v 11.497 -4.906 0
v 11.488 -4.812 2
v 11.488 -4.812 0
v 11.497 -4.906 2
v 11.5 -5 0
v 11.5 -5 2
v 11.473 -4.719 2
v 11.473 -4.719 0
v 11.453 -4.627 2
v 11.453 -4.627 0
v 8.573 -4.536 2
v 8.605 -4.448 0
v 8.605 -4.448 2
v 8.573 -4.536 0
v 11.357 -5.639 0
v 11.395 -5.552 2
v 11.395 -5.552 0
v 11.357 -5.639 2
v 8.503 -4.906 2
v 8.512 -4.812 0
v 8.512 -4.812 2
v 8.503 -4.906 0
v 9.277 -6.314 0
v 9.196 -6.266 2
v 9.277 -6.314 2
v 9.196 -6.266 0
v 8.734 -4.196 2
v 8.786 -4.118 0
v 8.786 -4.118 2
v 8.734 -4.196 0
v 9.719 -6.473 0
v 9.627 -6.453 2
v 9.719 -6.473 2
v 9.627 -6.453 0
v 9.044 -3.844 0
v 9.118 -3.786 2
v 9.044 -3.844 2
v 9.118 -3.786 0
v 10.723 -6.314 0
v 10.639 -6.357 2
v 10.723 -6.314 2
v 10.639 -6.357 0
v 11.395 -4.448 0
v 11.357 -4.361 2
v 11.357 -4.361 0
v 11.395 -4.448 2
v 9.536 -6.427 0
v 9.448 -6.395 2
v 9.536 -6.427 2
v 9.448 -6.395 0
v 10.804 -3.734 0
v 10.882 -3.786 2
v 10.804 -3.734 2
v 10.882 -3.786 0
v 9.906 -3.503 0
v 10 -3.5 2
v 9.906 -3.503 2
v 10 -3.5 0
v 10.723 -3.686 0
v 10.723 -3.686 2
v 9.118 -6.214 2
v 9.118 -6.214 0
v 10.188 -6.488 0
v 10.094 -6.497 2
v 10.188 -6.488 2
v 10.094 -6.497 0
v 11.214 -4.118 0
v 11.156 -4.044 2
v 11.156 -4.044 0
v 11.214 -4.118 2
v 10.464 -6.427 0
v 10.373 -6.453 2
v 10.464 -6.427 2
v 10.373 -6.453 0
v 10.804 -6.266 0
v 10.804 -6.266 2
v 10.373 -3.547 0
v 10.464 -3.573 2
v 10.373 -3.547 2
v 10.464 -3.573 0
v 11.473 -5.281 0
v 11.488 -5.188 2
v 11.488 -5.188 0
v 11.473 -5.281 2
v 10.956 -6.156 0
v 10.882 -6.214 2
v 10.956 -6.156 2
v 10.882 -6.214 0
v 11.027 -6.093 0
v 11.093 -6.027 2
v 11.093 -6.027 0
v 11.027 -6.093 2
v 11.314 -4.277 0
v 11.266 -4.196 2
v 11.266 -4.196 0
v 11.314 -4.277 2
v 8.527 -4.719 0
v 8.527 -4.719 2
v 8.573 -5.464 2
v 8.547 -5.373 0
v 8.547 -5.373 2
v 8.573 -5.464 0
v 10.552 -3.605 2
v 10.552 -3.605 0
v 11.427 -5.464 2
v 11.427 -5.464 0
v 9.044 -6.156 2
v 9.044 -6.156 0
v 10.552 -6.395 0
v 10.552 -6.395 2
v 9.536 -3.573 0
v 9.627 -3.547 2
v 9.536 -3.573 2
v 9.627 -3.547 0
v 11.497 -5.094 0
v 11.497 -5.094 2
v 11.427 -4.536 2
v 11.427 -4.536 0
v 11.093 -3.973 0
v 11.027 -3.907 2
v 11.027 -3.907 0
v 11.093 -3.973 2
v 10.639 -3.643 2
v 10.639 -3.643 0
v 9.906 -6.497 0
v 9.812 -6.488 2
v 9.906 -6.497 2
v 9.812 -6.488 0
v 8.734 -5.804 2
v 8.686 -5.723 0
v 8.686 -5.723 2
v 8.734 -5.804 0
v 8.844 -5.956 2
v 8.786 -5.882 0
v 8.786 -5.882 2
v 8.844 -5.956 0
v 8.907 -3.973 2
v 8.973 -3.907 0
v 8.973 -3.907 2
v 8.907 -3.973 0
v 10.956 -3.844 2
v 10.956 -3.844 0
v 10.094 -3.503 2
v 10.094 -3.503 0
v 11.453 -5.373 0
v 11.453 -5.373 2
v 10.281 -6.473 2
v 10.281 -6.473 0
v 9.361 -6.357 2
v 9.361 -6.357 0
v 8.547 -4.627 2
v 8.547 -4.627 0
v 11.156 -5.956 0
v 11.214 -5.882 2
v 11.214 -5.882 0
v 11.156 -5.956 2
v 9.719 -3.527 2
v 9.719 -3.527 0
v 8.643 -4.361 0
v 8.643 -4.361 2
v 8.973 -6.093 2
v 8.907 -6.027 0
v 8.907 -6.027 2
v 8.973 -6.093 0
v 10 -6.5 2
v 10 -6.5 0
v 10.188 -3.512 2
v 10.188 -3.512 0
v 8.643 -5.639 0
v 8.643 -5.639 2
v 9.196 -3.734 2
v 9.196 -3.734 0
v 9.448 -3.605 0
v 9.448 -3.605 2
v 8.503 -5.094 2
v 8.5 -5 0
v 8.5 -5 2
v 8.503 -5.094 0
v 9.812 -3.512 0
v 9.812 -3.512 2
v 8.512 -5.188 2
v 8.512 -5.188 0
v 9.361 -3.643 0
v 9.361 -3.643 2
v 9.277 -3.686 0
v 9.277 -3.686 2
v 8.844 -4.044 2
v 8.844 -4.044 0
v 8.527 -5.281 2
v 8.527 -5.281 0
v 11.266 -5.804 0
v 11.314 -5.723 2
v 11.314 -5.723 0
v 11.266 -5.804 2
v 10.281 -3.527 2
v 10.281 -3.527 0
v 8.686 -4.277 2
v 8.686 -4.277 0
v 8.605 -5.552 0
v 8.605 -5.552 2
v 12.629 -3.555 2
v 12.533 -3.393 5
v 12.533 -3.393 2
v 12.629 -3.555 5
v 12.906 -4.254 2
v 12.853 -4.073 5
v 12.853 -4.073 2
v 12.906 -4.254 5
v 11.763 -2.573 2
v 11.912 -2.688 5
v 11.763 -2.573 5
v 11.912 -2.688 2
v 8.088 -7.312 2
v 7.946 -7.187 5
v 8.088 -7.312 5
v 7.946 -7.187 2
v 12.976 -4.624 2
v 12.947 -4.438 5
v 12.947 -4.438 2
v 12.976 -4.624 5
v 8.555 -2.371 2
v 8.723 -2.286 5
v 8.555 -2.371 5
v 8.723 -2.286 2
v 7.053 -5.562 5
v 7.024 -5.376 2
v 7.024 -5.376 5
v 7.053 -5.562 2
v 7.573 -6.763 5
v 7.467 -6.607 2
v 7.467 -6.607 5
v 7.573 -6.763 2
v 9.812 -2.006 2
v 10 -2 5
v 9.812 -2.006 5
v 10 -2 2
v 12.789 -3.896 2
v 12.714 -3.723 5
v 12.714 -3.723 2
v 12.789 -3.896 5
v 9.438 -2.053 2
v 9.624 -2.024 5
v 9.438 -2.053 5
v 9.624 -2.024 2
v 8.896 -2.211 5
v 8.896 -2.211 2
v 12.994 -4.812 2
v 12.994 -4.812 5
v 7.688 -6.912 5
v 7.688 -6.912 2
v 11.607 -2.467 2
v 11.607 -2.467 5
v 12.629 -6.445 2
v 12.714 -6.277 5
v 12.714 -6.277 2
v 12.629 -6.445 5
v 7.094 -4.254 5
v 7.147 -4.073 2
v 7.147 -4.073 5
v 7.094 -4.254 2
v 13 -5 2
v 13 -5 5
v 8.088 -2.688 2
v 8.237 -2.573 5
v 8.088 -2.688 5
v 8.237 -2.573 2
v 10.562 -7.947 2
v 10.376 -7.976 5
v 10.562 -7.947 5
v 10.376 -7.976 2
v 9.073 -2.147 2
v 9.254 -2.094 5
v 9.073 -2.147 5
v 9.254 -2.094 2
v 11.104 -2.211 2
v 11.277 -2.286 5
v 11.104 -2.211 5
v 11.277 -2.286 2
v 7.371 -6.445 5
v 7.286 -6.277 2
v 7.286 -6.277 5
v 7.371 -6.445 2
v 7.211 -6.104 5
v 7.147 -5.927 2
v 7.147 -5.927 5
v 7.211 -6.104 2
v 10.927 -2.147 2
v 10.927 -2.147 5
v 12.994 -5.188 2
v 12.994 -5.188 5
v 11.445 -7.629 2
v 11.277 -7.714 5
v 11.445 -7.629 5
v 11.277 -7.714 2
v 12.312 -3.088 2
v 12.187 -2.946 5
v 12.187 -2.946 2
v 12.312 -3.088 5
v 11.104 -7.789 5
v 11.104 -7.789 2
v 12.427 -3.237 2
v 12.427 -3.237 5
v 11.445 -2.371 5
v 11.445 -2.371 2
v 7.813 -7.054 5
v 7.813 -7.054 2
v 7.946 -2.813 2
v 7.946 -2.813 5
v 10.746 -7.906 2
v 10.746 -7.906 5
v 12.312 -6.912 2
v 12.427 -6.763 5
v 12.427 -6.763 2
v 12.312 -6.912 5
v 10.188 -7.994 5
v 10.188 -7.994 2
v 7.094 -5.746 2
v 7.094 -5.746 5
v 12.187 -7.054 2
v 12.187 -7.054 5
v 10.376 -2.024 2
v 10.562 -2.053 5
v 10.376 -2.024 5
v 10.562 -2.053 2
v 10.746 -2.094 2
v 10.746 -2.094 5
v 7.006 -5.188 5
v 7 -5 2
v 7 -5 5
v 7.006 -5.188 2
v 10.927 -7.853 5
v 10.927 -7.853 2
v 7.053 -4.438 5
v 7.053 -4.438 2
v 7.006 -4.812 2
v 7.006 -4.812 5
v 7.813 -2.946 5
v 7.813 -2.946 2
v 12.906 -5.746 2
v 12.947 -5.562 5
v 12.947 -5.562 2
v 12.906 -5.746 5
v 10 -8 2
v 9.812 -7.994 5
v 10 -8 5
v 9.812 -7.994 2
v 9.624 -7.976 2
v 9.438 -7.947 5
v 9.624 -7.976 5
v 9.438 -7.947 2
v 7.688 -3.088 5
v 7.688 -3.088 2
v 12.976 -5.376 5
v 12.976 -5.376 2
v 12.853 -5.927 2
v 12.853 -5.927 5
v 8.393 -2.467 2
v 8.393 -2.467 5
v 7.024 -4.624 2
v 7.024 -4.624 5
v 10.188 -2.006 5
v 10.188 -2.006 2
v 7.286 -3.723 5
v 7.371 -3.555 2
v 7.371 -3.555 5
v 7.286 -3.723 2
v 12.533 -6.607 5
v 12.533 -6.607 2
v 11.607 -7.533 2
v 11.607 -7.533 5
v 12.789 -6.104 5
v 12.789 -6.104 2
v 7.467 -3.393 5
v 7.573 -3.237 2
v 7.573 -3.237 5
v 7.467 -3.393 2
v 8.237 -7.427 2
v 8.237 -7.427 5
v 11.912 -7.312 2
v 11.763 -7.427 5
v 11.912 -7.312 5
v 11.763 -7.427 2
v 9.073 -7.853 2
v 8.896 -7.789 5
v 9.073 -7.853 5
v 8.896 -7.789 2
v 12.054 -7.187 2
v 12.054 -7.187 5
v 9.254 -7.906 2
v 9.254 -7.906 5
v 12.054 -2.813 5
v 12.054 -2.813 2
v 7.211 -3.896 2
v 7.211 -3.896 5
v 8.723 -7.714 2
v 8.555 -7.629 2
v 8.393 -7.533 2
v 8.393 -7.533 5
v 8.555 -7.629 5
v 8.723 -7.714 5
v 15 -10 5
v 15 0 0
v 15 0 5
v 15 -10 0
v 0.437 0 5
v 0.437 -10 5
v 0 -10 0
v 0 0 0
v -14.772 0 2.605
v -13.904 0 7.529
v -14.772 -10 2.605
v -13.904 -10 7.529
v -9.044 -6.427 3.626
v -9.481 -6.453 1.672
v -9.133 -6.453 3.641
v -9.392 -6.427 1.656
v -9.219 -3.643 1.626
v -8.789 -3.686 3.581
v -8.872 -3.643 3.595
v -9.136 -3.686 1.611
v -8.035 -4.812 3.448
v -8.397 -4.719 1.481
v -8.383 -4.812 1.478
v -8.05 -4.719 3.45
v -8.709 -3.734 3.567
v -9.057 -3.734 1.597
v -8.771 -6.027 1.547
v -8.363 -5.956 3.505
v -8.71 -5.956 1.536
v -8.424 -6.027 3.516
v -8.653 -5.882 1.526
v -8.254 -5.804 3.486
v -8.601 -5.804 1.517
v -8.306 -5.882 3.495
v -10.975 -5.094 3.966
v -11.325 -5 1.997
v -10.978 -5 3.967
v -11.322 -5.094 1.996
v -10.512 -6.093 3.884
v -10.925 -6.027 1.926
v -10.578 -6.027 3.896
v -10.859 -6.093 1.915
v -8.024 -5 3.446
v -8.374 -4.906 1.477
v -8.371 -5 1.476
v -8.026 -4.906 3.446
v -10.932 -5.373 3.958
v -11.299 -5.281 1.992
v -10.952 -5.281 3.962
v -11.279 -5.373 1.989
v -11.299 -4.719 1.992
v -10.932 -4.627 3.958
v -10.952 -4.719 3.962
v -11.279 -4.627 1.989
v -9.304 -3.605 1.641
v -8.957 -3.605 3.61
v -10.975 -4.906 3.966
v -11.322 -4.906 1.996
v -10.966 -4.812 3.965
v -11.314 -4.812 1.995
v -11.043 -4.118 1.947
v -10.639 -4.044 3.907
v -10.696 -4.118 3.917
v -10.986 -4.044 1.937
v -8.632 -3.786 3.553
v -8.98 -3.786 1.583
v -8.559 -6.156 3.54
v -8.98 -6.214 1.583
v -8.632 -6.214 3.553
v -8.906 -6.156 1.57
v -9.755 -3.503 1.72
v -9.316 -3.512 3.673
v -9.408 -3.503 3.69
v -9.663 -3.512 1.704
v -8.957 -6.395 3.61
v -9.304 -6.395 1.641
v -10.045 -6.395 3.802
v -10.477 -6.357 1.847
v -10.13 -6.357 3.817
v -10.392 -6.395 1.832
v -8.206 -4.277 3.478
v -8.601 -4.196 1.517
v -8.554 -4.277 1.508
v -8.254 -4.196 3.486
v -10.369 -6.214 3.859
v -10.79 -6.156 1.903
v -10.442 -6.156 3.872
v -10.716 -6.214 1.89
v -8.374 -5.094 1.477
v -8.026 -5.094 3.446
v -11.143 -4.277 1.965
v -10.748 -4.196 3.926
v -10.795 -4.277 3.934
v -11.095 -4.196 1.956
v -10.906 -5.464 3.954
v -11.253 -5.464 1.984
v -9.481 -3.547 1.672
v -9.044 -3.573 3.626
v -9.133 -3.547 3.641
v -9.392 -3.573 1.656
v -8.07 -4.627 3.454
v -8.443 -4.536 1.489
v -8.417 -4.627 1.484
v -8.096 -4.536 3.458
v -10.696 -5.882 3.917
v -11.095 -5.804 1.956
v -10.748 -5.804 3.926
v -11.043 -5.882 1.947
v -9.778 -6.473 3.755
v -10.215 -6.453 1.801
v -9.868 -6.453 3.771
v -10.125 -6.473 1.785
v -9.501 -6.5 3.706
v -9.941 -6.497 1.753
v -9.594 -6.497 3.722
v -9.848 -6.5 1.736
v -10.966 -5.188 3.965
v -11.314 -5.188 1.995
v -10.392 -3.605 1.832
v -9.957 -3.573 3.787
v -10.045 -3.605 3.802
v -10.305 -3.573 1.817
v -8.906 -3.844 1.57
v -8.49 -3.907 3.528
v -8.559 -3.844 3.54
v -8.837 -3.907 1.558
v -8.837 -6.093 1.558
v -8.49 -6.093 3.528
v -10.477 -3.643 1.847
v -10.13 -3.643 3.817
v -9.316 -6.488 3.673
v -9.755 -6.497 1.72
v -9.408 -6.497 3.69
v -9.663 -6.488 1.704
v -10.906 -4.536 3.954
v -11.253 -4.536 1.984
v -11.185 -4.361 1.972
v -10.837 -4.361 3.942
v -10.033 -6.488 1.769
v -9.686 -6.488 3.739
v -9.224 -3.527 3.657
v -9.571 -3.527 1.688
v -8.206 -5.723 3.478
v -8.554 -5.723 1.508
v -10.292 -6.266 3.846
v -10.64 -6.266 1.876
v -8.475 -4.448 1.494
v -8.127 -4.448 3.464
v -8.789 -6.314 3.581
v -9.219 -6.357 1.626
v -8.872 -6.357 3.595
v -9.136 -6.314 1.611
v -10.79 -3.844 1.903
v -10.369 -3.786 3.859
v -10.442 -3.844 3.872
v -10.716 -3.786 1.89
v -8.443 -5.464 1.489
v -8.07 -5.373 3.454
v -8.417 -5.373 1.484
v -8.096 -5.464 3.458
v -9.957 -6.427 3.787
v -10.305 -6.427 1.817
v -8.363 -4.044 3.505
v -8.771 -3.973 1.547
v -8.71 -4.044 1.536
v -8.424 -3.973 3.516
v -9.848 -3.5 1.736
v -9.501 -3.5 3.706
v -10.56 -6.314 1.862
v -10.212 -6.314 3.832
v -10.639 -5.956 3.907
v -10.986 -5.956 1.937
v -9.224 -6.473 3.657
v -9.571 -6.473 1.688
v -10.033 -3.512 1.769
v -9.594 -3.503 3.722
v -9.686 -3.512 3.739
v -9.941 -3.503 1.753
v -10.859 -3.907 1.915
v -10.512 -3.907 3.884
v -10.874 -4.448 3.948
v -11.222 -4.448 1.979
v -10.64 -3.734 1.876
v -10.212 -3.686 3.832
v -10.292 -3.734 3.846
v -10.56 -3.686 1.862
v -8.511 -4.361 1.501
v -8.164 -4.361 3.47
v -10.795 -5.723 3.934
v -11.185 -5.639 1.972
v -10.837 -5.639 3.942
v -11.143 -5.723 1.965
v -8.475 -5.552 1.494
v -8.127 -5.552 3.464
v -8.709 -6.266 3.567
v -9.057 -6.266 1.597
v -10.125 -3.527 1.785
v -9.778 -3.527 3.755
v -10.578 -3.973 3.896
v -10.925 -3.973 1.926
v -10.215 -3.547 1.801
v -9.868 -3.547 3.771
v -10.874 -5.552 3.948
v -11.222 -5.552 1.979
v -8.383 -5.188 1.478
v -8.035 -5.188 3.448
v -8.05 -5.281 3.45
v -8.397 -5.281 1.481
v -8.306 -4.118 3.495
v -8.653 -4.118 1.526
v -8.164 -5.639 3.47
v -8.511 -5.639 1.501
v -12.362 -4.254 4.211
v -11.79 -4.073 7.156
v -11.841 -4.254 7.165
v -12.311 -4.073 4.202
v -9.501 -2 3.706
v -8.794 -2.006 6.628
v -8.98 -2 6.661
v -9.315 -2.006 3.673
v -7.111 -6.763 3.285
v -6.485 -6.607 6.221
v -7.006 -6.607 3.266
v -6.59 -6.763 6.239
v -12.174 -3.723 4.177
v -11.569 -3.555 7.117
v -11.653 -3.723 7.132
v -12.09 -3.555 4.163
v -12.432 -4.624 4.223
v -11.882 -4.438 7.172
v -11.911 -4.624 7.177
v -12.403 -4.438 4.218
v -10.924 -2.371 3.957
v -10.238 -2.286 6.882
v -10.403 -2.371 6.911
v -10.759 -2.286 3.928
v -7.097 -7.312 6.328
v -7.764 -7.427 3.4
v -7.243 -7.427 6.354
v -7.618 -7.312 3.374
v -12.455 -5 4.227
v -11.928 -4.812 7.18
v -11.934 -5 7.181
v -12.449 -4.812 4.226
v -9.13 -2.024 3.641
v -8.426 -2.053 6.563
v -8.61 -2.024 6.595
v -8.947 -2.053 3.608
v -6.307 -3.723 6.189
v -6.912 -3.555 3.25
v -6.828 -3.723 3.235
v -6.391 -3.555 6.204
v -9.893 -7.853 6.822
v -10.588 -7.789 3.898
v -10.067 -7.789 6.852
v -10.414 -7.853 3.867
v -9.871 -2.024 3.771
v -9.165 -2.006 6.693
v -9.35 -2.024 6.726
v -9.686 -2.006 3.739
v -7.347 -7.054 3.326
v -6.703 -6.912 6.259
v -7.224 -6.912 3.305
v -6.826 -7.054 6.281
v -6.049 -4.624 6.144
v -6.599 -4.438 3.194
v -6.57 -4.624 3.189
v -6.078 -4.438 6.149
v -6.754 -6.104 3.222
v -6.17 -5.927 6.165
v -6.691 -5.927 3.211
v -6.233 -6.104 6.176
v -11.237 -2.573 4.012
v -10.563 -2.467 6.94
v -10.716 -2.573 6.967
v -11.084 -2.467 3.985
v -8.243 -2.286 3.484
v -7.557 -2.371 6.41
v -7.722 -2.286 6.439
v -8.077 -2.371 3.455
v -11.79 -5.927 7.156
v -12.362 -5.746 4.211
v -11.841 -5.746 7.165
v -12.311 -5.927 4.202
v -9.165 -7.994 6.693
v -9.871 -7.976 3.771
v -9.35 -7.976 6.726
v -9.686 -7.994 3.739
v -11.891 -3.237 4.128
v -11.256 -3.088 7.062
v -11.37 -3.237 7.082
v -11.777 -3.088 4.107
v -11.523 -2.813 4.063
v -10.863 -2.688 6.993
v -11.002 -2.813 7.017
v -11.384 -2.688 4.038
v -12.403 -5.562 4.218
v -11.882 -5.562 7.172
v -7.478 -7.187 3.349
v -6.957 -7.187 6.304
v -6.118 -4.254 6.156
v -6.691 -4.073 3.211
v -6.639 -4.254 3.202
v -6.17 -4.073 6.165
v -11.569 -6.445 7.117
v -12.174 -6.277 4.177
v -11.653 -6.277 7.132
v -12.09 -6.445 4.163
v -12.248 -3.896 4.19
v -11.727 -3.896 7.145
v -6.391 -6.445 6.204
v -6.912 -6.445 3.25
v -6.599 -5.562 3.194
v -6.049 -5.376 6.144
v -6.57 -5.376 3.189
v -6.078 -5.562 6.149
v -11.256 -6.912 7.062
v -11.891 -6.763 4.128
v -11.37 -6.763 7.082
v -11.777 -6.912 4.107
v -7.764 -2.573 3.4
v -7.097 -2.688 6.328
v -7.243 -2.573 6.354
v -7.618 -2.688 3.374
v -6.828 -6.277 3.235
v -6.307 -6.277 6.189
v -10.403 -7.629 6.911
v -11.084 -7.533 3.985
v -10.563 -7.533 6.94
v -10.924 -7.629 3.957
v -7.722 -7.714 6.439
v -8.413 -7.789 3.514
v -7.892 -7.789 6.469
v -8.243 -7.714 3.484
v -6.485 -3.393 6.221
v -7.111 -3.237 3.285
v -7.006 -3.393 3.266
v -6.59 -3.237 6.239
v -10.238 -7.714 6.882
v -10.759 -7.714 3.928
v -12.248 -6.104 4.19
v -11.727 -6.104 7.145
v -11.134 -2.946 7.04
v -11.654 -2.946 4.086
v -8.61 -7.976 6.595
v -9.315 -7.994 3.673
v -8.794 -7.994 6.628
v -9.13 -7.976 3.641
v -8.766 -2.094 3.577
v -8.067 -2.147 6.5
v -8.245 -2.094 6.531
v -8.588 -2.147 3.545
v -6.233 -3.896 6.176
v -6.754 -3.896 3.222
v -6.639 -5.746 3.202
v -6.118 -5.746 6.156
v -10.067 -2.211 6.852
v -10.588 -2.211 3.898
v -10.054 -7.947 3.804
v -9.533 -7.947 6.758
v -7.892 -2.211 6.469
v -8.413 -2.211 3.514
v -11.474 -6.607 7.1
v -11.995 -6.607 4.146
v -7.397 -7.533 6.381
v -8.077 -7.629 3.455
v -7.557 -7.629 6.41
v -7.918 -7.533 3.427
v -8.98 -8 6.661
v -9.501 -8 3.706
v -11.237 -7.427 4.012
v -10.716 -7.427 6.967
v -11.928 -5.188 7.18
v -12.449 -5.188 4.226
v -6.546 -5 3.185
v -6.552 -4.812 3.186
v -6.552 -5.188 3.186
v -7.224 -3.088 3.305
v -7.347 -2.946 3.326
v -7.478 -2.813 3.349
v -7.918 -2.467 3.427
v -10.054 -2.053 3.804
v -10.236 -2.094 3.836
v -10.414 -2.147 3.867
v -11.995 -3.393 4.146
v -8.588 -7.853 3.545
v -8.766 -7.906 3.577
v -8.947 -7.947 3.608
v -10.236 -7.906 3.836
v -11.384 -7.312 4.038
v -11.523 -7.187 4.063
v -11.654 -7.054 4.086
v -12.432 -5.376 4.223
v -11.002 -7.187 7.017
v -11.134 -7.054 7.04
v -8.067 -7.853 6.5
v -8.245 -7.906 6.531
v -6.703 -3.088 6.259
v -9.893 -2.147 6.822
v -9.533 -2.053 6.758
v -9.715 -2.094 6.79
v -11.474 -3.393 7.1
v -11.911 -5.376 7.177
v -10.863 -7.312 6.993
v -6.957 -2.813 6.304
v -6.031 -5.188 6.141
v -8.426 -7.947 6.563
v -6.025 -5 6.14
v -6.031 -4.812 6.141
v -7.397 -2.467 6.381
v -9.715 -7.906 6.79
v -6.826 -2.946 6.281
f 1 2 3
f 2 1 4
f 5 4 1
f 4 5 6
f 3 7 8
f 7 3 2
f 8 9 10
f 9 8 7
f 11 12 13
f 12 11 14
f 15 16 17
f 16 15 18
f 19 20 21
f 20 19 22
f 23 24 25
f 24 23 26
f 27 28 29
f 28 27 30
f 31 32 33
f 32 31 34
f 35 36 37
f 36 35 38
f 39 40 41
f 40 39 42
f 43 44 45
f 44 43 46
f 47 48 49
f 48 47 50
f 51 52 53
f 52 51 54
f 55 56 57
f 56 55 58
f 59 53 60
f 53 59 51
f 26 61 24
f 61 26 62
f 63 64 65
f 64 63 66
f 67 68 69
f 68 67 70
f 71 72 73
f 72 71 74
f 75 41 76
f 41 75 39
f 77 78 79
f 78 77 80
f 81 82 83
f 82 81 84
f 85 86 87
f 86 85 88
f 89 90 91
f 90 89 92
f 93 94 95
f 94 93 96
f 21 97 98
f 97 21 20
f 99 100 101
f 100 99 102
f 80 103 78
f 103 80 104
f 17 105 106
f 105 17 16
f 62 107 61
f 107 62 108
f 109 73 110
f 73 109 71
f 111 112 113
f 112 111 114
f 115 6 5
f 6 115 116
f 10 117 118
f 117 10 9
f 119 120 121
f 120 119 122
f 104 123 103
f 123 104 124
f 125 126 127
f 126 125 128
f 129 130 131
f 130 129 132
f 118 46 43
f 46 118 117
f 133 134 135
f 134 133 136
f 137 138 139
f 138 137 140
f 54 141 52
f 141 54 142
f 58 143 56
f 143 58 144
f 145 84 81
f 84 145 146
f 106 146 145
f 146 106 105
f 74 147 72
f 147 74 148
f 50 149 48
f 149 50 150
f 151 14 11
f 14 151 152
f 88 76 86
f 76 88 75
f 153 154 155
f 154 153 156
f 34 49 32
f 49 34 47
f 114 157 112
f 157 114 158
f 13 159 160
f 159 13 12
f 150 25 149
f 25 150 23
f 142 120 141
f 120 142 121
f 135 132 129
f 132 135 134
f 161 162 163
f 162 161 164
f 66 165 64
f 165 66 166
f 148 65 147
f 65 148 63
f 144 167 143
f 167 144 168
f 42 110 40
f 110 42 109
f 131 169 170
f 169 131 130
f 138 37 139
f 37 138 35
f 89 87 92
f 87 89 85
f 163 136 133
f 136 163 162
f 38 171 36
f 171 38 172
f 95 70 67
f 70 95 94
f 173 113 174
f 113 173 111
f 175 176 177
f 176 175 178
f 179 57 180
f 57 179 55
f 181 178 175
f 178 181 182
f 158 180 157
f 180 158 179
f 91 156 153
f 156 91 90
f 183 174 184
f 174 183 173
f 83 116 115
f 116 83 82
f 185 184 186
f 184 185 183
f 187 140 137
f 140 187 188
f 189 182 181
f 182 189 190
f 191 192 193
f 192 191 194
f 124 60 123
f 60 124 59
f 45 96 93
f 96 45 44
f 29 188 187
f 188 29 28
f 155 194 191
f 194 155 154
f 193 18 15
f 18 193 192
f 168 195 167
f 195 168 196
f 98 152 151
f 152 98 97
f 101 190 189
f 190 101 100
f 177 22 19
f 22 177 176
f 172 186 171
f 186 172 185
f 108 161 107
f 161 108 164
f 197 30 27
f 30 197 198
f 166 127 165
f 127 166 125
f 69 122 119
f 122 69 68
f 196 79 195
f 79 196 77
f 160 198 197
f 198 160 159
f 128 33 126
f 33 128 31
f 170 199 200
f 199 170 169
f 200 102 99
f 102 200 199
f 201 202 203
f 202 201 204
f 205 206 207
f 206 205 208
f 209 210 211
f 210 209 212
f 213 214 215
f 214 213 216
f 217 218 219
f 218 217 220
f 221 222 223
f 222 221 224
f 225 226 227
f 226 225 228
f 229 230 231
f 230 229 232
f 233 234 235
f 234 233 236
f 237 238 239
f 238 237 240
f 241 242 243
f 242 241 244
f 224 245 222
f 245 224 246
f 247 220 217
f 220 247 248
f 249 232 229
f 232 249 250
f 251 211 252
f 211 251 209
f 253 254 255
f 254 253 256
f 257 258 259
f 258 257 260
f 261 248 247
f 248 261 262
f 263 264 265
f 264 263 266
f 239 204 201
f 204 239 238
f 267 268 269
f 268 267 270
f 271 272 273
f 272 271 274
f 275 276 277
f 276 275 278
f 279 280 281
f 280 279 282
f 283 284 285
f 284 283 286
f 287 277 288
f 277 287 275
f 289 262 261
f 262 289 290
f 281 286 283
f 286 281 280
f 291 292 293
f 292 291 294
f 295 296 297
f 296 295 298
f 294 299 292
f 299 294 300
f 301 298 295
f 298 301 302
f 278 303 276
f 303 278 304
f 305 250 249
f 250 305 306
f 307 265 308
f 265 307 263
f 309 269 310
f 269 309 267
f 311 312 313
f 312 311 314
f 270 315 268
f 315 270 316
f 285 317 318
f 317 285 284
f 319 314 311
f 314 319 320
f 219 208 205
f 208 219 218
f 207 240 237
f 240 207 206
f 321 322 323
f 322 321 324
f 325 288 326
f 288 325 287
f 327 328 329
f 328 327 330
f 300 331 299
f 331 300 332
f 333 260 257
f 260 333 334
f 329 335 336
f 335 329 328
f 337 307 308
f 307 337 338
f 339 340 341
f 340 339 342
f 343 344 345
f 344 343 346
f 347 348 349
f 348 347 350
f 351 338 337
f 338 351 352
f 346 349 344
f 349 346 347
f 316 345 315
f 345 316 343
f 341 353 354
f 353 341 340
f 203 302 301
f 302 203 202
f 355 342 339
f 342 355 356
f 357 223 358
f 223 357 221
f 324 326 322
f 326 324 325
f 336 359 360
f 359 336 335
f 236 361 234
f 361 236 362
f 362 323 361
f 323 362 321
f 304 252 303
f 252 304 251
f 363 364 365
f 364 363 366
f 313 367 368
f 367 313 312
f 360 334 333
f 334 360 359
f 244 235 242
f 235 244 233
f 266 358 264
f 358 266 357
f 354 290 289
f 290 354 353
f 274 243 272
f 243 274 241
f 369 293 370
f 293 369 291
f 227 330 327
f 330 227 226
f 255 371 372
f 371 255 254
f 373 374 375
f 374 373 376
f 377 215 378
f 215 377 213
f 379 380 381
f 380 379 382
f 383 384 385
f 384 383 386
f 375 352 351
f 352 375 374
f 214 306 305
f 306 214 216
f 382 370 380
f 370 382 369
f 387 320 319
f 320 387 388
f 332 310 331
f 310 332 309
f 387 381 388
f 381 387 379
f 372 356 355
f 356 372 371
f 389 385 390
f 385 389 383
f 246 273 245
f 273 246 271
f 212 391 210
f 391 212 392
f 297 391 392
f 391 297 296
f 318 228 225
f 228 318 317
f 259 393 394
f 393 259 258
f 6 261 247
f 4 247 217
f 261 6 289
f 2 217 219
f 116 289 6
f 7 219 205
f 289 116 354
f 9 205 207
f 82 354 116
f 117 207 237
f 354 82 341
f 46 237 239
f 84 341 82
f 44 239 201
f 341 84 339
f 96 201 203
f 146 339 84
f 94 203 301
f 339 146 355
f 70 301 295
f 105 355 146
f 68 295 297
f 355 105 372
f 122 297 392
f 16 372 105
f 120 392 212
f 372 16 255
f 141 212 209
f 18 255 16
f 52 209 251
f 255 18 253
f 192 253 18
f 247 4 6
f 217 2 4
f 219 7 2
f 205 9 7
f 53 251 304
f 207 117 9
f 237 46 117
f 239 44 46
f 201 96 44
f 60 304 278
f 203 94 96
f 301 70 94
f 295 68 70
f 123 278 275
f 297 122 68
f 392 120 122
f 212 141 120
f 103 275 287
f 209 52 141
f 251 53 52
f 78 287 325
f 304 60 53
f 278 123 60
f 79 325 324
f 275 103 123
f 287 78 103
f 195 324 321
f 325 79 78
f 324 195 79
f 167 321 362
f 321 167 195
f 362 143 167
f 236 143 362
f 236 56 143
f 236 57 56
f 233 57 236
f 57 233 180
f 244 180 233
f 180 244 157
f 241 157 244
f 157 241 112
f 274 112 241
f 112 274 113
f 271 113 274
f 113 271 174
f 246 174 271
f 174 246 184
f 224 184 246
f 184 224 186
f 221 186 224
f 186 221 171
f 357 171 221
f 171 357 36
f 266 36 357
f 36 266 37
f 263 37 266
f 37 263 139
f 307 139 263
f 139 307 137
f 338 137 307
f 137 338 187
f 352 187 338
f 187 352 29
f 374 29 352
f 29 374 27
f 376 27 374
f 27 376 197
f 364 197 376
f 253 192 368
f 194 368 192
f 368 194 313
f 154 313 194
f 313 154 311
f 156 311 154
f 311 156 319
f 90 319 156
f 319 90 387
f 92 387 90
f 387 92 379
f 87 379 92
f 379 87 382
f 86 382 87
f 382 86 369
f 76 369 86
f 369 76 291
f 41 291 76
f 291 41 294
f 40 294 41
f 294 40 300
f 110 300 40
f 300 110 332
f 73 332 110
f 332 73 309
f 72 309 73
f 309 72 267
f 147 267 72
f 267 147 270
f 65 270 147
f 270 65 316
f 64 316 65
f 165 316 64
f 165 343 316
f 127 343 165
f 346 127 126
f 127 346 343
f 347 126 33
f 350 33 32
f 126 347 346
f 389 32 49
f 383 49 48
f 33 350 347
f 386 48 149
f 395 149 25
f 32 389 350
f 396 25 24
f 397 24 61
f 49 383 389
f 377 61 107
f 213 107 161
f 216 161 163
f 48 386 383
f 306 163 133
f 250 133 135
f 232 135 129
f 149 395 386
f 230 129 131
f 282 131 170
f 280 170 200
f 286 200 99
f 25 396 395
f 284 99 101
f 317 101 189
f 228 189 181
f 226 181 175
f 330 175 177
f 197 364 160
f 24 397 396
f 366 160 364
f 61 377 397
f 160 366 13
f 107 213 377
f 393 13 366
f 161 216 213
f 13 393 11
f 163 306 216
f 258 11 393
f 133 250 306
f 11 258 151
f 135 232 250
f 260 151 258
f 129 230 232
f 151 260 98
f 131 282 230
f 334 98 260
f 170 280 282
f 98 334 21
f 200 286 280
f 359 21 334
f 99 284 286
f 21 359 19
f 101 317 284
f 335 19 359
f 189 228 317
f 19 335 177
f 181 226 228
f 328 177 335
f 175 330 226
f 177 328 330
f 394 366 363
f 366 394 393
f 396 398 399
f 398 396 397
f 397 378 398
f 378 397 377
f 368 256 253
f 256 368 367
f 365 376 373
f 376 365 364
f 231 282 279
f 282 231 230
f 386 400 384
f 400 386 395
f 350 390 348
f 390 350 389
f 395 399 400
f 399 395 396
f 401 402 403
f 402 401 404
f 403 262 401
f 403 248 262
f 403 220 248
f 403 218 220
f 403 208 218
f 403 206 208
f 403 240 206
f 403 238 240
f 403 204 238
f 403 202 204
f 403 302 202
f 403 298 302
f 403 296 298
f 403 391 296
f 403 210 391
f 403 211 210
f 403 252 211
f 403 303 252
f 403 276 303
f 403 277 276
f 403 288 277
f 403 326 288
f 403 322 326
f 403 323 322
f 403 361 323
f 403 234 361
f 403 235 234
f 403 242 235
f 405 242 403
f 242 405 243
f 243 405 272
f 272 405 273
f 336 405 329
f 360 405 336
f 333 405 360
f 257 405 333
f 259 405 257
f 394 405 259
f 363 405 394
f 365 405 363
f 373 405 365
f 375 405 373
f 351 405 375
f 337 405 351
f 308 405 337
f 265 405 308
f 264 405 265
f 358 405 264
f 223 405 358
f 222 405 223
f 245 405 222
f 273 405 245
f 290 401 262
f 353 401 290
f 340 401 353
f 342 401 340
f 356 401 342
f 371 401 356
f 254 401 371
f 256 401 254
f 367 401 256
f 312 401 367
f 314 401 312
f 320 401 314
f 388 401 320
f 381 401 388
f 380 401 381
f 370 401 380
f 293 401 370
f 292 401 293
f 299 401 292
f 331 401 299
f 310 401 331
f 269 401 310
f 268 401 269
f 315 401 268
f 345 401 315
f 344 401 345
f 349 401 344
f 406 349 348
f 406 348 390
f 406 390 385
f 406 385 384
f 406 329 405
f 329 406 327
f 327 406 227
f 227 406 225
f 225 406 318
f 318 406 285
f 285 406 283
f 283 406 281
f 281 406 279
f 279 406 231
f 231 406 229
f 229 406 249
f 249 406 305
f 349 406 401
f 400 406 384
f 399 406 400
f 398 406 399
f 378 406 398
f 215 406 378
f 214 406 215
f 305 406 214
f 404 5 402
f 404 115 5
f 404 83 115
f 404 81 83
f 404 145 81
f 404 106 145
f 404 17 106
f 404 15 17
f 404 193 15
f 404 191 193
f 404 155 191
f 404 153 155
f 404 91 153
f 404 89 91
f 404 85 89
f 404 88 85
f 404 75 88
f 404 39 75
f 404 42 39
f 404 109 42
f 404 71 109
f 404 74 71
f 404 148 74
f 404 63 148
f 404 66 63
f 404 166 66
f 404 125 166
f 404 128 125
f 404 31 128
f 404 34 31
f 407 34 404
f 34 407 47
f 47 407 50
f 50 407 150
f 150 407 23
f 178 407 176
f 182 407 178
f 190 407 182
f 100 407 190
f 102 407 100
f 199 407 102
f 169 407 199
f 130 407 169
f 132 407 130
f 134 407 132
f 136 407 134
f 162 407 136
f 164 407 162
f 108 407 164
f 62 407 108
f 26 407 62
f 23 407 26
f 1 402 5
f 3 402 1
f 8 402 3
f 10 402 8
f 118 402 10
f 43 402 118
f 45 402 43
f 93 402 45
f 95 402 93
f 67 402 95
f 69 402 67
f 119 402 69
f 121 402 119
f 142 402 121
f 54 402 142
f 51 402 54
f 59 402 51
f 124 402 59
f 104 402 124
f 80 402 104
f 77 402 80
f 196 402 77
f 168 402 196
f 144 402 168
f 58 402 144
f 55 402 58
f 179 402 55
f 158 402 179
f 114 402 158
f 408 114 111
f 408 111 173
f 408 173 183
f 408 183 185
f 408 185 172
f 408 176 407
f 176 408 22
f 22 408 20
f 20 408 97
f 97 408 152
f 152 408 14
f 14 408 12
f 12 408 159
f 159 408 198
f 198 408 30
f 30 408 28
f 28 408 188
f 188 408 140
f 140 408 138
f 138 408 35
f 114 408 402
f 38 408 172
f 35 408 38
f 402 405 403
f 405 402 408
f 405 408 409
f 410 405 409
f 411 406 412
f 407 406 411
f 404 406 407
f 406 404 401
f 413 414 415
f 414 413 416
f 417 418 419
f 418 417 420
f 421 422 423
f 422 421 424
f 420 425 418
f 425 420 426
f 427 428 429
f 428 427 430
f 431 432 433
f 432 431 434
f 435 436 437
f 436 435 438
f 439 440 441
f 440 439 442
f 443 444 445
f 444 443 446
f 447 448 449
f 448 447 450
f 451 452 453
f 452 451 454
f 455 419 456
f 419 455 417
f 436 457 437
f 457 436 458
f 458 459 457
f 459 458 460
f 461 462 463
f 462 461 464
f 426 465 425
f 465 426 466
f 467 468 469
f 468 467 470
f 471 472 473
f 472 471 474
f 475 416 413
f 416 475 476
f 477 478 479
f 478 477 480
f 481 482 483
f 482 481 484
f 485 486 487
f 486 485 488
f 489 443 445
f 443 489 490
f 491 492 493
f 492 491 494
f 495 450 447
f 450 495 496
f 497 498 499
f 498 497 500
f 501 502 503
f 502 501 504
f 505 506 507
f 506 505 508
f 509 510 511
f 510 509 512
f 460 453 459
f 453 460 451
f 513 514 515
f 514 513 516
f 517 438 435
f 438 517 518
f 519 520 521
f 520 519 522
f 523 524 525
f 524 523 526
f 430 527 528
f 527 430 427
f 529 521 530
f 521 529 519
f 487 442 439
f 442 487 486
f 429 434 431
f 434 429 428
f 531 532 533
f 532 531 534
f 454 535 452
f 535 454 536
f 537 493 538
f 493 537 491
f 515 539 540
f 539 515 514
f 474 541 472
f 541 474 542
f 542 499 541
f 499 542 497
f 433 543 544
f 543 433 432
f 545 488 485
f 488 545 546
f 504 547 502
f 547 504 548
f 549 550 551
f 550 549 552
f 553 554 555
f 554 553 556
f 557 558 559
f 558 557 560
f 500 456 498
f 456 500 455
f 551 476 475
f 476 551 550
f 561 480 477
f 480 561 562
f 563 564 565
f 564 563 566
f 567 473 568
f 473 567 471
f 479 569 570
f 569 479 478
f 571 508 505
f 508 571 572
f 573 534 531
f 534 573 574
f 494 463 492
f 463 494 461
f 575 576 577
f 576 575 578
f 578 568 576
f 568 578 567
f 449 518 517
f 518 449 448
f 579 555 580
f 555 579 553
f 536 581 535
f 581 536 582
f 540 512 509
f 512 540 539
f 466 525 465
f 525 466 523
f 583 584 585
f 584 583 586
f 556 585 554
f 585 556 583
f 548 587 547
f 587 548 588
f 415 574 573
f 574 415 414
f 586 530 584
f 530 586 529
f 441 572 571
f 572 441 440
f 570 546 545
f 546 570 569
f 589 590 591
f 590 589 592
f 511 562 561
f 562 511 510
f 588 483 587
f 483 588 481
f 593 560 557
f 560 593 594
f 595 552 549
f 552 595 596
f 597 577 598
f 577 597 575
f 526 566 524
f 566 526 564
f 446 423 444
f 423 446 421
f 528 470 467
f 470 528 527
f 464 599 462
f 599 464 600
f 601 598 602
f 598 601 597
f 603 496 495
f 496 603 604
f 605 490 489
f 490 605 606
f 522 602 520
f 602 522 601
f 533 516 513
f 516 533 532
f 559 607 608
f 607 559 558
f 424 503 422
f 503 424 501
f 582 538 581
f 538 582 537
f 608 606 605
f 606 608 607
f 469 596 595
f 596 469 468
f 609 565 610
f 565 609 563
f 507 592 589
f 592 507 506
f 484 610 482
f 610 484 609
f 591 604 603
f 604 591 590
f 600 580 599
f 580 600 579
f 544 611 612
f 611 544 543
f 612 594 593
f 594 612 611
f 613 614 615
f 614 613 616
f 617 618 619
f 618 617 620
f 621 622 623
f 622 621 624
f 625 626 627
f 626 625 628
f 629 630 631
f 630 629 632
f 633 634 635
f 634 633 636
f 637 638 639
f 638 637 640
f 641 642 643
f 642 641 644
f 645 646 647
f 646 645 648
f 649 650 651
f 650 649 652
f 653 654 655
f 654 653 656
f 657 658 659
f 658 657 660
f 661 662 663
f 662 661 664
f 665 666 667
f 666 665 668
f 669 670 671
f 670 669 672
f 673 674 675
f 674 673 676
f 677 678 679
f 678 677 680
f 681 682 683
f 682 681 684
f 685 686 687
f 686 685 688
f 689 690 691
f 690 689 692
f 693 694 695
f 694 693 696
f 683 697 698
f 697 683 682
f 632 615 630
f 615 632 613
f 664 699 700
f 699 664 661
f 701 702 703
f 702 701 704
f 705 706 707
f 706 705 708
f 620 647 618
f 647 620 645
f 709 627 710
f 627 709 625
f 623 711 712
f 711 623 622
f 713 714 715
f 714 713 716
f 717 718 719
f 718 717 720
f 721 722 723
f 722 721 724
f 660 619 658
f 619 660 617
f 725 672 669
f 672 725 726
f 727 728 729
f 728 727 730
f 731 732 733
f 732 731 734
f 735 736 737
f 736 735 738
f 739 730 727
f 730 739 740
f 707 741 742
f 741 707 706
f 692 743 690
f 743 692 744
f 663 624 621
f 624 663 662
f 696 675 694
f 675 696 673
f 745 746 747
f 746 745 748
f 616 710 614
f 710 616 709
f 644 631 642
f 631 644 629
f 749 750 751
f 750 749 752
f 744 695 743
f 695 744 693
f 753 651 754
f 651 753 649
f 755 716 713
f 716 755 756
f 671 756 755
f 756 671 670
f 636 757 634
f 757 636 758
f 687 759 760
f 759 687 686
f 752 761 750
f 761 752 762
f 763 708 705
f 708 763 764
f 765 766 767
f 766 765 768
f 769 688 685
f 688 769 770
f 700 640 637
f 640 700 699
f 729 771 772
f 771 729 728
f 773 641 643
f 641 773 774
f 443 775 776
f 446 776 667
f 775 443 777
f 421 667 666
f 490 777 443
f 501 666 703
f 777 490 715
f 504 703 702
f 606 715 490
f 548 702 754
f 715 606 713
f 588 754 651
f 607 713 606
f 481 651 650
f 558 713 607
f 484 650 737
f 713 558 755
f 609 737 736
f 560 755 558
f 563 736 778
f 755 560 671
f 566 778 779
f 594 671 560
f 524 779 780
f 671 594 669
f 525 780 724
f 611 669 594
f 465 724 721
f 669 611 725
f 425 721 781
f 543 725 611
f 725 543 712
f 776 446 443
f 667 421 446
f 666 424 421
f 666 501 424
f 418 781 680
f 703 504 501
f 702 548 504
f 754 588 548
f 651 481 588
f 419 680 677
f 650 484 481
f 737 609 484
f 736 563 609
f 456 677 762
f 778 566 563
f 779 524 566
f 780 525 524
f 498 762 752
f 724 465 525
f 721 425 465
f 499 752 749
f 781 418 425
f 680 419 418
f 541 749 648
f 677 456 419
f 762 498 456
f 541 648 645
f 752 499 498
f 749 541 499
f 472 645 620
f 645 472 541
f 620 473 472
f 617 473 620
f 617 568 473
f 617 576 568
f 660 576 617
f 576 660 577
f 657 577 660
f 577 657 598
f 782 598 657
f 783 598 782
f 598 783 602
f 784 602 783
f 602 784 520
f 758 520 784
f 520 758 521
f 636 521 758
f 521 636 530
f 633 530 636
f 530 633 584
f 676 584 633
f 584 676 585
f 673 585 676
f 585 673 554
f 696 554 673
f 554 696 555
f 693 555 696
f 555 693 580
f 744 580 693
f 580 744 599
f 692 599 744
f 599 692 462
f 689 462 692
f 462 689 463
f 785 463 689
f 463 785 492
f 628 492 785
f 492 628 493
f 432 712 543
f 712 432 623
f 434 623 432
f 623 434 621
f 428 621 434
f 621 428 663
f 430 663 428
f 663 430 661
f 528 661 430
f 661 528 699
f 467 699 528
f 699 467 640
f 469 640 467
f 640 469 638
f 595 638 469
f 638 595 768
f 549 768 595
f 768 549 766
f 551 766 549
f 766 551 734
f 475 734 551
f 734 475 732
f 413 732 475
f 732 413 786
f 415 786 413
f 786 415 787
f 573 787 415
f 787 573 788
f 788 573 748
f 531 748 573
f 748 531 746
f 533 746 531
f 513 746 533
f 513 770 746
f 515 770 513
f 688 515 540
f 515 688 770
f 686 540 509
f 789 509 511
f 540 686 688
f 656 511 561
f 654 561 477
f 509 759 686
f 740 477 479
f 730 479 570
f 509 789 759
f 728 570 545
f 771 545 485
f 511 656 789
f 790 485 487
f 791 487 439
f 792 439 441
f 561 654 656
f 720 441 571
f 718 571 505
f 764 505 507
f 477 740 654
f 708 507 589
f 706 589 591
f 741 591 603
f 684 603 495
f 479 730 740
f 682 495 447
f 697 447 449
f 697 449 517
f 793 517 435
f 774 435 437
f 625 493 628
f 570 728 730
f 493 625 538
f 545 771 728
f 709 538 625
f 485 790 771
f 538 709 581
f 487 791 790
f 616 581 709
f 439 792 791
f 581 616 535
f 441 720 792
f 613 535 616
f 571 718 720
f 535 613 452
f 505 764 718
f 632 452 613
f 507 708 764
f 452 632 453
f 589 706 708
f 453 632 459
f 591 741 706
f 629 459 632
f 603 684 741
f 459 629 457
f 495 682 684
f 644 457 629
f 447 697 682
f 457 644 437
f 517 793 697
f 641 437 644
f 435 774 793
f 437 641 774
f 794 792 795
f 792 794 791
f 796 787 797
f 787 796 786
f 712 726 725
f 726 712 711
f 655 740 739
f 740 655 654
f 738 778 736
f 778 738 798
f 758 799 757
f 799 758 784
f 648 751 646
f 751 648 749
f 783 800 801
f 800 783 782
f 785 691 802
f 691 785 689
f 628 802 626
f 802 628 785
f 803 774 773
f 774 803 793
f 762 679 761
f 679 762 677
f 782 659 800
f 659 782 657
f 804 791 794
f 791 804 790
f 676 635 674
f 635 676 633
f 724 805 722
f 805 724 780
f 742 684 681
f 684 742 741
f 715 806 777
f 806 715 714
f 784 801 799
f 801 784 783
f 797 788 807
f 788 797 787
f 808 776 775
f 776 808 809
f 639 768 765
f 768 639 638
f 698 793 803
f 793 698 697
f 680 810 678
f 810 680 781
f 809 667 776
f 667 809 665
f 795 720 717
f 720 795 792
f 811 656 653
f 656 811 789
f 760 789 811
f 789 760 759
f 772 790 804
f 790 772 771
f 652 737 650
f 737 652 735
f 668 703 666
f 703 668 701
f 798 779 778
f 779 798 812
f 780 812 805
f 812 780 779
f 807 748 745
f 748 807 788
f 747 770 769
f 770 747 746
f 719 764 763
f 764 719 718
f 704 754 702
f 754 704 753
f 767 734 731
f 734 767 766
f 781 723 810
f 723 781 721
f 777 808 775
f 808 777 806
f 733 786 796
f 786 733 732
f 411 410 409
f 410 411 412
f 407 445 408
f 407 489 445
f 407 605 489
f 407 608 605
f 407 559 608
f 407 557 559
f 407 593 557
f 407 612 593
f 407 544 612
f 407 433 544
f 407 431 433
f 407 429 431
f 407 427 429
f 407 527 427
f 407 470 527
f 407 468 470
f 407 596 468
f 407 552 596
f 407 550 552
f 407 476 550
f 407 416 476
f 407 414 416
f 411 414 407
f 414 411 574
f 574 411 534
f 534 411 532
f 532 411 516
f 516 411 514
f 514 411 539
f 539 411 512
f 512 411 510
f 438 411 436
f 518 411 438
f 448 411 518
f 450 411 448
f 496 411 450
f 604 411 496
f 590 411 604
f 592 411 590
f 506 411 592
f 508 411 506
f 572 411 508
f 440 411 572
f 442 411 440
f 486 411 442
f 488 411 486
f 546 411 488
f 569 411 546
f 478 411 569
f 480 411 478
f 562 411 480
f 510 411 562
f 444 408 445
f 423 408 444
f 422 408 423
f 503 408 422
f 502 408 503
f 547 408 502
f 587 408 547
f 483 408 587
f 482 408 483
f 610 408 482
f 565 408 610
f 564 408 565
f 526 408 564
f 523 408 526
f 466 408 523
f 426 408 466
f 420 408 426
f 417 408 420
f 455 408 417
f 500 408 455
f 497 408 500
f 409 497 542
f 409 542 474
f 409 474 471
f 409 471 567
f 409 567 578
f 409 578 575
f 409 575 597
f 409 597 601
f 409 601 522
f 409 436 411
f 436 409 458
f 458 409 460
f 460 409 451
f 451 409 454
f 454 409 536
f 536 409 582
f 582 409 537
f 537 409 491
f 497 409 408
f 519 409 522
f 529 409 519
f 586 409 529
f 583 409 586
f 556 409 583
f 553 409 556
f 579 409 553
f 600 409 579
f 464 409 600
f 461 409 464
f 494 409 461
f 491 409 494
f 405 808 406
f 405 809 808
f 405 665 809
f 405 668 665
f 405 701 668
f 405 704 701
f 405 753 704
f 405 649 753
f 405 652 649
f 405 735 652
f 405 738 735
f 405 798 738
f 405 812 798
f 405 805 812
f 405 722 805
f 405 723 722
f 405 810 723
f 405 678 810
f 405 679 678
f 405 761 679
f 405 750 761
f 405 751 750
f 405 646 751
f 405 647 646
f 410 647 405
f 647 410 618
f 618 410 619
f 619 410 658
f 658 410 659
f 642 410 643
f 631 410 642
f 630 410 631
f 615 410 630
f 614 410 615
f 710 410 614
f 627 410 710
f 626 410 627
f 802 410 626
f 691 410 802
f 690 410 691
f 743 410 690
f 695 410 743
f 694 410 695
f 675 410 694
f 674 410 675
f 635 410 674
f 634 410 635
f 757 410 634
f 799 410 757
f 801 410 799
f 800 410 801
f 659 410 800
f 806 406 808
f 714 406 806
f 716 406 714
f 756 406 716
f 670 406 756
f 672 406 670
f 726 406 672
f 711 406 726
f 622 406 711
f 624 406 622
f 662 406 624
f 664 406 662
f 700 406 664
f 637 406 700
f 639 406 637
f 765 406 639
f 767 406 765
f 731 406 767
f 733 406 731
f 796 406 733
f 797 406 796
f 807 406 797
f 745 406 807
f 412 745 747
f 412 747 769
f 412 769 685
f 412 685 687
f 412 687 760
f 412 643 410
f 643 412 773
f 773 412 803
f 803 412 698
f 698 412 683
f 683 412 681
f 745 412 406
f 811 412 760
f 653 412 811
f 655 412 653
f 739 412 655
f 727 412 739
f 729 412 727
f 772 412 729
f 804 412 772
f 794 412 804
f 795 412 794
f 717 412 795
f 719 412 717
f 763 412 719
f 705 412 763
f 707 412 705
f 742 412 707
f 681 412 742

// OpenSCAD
// ************* Credits part *************
// "Fixing customize w" 
// Programmed by Rudy RUFFEL - Decembre 2014
// Optimized for Customizer makerbot
//
//
//********************** License ******************
//**         "Fixing customize" by rr2s          **
//**  is licensed under the Creative Commons     **
//** - Attribution - Non-Commercial license.     **
//*************************************************
//
//
// ************* Declaration part *************

/* [Dimensions] */ 
// (Width this number will be multiplied by the number of screws on height (in mm). Example : if you specify 15mm and there are two screws on height, the total height will be 30mm. The thickness of wall is proportional to the width if you indicates a width 15mm  the thickness will  5mm. But you can change if you wantt hickness in tab)
Width         = 15;       
// (Length of fixing this number will multipier by the number of screw on length (in mm). Example : if you specify 10 and there are two screws on length, the total length will be 20.)
Height        = 10;
// Angle is 60 °. It can not be over because the screws not spend mounting. You can choose an angle between 90 ° and 0 °.
angle = 10;


/* [screw] */
// (number of height screw, if you want one screw.)
NumberOfScrewHeight  = 1;
// (number of width screw)
NumberOfScrewWidth = 1  ; 
// (diameter of screw) 
DiametreScrew = 3;        
// (screw head diameter of generally 2 times the diameter of the screw. Attention ! Check that the width and height is supperior in diameter screws.)
DiametreHeadScrew = 6;
// (Height of the screw head, if you want that screw is flush chose 0. Attention ! Check that the width and height is supperior in diameter screws.)
HeightHeadScrew   = 3;
// (Resolution of screws)
ResolutionScrew=100; //[20:Draft,50:Medium,100:Fine, 200:Very fine]
	RS = ResolutionScrew;
// (Creates a hex or cylindrical head screws)
ResolutionHeadScrew=100; //[6:Bolt (hex),20:Draft,50:Medium,100:Fine, 200:Very fine]
	RH = ResolutionHeadScrew;


/* [Thickness] */
//(Thickness Wall is normaly proportional to the width (Width/3) if ThicknessWall = 0. But you can change if you want. Attention ! Check that the Thickness Wall is supperior at HeightHeadScrew.the dimention is in mm)
ThicknessWall = 0;



// ************* private variable *************
	//TH = Width/3;  //  ThicknessWall base if ThicknessWall = 0
	TH= ThicknessWall == 0  ? Width/3 : ThicknessWall;
	W = Width;     // Simplifying the Variable : Width 
	H = Height;    // Simplifying the Variable : Height
    NbScrew = NumberOfScrewHeight -1; // Simplifying the Variable : NumberOfScrewHeight
	rScrew = DiametreScrew/2;      // radius of the screw
	CWS = TH+((W-TH)/2); // centering the screw on width
	CHS = H/2; // centering the screw on Height
	rHScrew = DiametreHeadScrew/2;  //radius of the Head screw
	HHS = HeightHeadScrew; // Simplifying the Variable : HeightHeadScrew
	NbScrewWidth = NumberOfScrewWidth-1; // Simplifying the Variable :  NumberOfScrewWith


// ************* Executable part *************
union(){
    difference(){
        Base1();
        Cut();
    }

    rotate([0,angle-90,0])difference(){
        Base2();
        Cut();
    }
}



// ************* Module part simple screw *************

// Module de construction
module BaseVolume1(){
	for ( i = [0 : NbScrew] ){
		translate([0,(H*i)-H,0])  cube([W,H,TH]);
		}
}

// Module de construction
module BaseVolume2(){
	for ( i = [0 : NbScrew] ){
		translate([TH,(H*i)-H,0]) rotate([0,-90,0]) cube([W,H,TH]);
		}
}

module BaseScrew(){
	for ( i = [0 : NbScrew] ){
		translate([CWS,CHS+((i*H)-H),-W]) cylinder(W*2,rScrew,rScrew,$fn=RS);
		translate([W,CHS+((i*H)-H),CWS]) rotate([0,-90,0]) cylinder(W*2,rScrew,rScrew,$fn=RS);
	}
}

module BaseScrewHead(){
	for ( i = [0 : NbScrew] ){
		translate([CWS,CHS+((i*H)-H),TH-HHS]) cylinder(W*2,rHScrew,rHScrew,$fn=RH);
		translate([(W*2)+TH-HHS,CHS+((i*H)-H),CWS]) rotate([0,-90,0]) cylinder(W*2,rHScrew,rHScrew,$fn=RH);
	}
}

// ************* Module part multi-screw *************

 module BaseVolume1MultiScrew(){
	for ( e = [0 : NbScrewWidth] ){
		for ( i = [0 : NbScrew] ){
			union() {
			translate([(W-TH)*e+TH,(H*i)-H,0])cube([W-TH,H,TH]);
			}
		}
	}
}

 module BaseVolume2MultiScrew(){
	for ( e = [0 : NbScrewWidth] ){
		for ( i = [0 : NbScrew] ){
			union() {
			translate([TH,(H*i)-H,(W-TH)*e+TH]) rotate([0,-90,0]) cube([W-TH,H,TH]);
			}
		}
	}
}


module BaseScrewMulti(){
	for ( e = [0 : NbScrewWidth] ){
		for ( i = [0 : NbScrew] ){
			translate([CWS+((W-TH)*e),CHS+((i*H)-H),-W]) cylinder(W*2,rScrew,rScrew,$fn=RS);
			translate([W,CHS+((i*H)-H),CWS+(W-TH)*e]) rotate([0,-90,0]) cylinder(W*2,rScrew,rScrew,$fn=RS);
		}
	}
}


module BaseScrewHeadmulti(){
	for ( e = [0 : NbScrewWidth] ){
		for ( i = [0 : NbScrew] ){
			translate([CWS+((W-TH)*e),CHS+((i*H)-H),TH-HHS]) cylinder(W*2,rHScrew,rHScrew,$fn=RH);
			translate([(W*2)+TH-HHS,CHS+((i*H)-H),CWS+(W-TH)*e]) rotate([0,-90,0]) cylinder(W*2,rHScrew,rHScrew,$fn=RH);
		}
	}
}

// ************* Module grouping : base and cut  *************

// module of base
module Base1(){
        BaseVolume1();
		if (NbScrew > 0 || NbScrewWidth > 0) {
		BaseVolume1MultiScrew();
		}
}

// module of base
module Base2(){
		BaseVolume2();
		if (NbScrew > 0 || NbScrewWidth > 0) {
        BaseVolume2MultiScrew();   
		}
}



// module of cut
module Cut(){
	BaseScrew();
	BaseScrewHead();
 	if (NbScrew > 0 || NbScrewWidth > 0) {
	BaseScrewMulti();
	BaseScrewHeadmulti();
	}
}
